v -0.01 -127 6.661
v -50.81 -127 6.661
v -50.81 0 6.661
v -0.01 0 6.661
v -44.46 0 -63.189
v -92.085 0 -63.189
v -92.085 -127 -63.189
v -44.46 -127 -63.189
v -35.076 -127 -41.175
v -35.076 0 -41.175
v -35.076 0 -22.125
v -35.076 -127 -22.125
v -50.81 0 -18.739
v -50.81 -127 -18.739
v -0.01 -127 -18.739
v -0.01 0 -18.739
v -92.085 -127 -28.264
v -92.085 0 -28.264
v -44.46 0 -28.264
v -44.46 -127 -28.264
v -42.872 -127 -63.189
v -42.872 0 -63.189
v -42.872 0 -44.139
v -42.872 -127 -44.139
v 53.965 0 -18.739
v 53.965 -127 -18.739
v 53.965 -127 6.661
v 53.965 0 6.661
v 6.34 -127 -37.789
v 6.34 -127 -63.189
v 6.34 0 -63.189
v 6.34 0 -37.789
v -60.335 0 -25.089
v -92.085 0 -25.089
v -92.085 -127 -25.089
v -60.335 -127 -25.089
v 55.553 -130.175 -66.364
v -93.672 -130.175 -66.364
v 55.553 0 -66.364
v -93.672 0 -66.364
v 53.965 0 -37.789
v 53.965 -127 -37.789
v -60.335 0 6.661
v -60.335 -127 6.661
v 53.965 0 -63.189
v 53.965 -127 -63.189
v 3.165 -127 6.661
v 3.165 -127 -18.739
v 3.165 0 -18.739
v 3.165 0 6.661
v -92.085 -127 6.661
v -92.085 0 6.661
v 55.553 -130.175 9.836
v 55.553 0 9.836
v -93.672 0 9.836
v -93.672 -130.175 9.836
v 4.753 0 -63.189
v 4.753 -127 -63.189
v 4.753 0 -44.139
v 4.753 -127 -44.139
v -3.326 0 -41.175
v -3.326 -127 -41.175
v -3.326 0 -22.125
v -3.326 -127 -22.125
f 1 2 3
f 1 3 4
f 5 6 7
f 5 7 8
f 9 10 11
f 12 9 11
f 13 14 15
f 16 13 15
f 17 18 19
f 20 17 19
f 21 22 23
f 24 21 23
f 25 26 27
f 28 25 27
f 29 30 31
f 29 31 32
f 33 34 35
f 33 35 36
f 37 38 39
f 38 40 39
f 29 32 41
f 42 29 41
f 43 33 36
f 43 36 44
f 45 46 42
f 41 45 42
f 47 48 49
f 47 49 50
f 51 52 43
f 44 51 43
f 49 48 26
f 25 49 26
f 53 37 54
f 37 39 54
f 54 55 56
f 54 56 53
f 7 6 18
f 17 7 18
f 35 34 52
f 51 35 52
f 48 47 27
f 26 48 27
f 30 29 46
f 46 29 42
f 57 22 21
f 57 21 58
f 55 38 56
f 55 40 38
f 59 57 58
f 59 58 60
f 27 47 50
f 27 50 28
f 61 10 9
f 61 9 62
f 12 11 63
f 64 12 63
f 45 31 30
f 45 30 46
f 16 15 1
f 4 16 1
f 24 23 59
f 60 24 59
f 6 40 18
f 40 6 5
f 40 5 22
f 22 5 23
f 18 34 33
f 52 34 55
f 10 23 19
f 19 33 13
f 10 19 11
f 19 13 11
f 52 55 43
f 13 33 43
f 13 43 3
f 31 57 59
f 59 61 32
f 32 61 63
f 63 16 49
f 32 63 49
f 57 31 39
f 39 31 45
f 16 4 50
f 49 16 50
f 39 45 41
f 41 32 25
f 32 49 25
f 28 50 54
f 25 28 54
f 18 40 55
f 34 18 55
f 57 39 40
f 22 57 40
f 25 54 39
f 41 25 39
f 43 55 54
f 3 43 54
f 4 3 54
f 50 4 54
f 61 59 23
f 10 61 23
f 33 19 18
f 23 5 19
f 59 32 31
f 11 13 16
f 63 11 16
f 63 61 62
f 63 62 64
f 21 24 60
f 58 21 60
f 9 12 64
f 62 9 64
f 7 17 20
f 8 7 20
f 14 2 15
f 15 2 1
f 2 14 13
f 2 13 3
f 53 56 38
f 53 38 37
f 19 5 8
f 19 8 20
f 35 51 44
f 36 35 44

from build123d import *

# Parameters (mm, degrees)
F0_W     = 149.225
F0_H     = 76.2
F0_W_2   = 47.625
F0_H_2   = 34.925
F0_W_3   = 31.75
F0_H_3   = 19.05
F0_H_4   = 25.4
F0_H_5   = 31.75
F0_W_4   = 50.8
F1_DEPTH = 127
F2_W     = 149.225
F2_H     = 76.2
F3_DEPTH = 3.175


# Not quite as in the source:
# - a length typed as a fraction of an inch, garbled in the dataset ("3 / 203.2 mm" for 3/8 in), is restored


with BuildPart() as f1:
    # F0 (on Front) → F1 (new body)
    with BuildSketch(Plane.XZ):
        with Locations((-19.0595093454, -28.2635252237)):
            Rectangle(F0_W, F0_H)
        with Locations((-68.2720093454, -45.7260252237)):
            Rectangle(F0_W_2, F0_H_2, mode=Mode.SUBTRACT)
        with Locations((-19.2011359204, -31.6498865128)):
            Rectangle(F0_W_3, F0_H_3, mode=Mode.SUBTRACT)
        with Locations((-19.0595093454, -53.6635252237)):
            Rectangle(F0_W_2, F0_H_3, mode=Mode.SUBTRACT)
        with Locations((30.1529906546, -50.4885252237)):
            Rectangle(F0_W_2, F0_H_4, mode=Mode.SUBTRACT)
        with Locations((-76.2095093454, -9.2135252237)):
            Rectangle(F0_W_3, F0_H_5, mode=Mode.SUBTRACT)
        with Locations((-25.4095093454, -6.0385252237)):
            Rectangle(F0_W_4, F0_H_4, mode=Mode.SUBTRACT)
        with Locations((28.5654906546, -6.0385252237)):
            Rectangle(F0_W_4, F0_H_4, mode=Mode.SUBTRACT)
    extrude(amount=F1_DEPTH)

    # F2 (on face) → F3 (join)
    with BuildSketch(Plane.XZ.offset(127)):
        with Locations((-19.0595093454, -28.2635252237)):
            Rectangle(F2_W, F2_H)
    extrude(amount=F3_DEPTH)


solid = f1.part
